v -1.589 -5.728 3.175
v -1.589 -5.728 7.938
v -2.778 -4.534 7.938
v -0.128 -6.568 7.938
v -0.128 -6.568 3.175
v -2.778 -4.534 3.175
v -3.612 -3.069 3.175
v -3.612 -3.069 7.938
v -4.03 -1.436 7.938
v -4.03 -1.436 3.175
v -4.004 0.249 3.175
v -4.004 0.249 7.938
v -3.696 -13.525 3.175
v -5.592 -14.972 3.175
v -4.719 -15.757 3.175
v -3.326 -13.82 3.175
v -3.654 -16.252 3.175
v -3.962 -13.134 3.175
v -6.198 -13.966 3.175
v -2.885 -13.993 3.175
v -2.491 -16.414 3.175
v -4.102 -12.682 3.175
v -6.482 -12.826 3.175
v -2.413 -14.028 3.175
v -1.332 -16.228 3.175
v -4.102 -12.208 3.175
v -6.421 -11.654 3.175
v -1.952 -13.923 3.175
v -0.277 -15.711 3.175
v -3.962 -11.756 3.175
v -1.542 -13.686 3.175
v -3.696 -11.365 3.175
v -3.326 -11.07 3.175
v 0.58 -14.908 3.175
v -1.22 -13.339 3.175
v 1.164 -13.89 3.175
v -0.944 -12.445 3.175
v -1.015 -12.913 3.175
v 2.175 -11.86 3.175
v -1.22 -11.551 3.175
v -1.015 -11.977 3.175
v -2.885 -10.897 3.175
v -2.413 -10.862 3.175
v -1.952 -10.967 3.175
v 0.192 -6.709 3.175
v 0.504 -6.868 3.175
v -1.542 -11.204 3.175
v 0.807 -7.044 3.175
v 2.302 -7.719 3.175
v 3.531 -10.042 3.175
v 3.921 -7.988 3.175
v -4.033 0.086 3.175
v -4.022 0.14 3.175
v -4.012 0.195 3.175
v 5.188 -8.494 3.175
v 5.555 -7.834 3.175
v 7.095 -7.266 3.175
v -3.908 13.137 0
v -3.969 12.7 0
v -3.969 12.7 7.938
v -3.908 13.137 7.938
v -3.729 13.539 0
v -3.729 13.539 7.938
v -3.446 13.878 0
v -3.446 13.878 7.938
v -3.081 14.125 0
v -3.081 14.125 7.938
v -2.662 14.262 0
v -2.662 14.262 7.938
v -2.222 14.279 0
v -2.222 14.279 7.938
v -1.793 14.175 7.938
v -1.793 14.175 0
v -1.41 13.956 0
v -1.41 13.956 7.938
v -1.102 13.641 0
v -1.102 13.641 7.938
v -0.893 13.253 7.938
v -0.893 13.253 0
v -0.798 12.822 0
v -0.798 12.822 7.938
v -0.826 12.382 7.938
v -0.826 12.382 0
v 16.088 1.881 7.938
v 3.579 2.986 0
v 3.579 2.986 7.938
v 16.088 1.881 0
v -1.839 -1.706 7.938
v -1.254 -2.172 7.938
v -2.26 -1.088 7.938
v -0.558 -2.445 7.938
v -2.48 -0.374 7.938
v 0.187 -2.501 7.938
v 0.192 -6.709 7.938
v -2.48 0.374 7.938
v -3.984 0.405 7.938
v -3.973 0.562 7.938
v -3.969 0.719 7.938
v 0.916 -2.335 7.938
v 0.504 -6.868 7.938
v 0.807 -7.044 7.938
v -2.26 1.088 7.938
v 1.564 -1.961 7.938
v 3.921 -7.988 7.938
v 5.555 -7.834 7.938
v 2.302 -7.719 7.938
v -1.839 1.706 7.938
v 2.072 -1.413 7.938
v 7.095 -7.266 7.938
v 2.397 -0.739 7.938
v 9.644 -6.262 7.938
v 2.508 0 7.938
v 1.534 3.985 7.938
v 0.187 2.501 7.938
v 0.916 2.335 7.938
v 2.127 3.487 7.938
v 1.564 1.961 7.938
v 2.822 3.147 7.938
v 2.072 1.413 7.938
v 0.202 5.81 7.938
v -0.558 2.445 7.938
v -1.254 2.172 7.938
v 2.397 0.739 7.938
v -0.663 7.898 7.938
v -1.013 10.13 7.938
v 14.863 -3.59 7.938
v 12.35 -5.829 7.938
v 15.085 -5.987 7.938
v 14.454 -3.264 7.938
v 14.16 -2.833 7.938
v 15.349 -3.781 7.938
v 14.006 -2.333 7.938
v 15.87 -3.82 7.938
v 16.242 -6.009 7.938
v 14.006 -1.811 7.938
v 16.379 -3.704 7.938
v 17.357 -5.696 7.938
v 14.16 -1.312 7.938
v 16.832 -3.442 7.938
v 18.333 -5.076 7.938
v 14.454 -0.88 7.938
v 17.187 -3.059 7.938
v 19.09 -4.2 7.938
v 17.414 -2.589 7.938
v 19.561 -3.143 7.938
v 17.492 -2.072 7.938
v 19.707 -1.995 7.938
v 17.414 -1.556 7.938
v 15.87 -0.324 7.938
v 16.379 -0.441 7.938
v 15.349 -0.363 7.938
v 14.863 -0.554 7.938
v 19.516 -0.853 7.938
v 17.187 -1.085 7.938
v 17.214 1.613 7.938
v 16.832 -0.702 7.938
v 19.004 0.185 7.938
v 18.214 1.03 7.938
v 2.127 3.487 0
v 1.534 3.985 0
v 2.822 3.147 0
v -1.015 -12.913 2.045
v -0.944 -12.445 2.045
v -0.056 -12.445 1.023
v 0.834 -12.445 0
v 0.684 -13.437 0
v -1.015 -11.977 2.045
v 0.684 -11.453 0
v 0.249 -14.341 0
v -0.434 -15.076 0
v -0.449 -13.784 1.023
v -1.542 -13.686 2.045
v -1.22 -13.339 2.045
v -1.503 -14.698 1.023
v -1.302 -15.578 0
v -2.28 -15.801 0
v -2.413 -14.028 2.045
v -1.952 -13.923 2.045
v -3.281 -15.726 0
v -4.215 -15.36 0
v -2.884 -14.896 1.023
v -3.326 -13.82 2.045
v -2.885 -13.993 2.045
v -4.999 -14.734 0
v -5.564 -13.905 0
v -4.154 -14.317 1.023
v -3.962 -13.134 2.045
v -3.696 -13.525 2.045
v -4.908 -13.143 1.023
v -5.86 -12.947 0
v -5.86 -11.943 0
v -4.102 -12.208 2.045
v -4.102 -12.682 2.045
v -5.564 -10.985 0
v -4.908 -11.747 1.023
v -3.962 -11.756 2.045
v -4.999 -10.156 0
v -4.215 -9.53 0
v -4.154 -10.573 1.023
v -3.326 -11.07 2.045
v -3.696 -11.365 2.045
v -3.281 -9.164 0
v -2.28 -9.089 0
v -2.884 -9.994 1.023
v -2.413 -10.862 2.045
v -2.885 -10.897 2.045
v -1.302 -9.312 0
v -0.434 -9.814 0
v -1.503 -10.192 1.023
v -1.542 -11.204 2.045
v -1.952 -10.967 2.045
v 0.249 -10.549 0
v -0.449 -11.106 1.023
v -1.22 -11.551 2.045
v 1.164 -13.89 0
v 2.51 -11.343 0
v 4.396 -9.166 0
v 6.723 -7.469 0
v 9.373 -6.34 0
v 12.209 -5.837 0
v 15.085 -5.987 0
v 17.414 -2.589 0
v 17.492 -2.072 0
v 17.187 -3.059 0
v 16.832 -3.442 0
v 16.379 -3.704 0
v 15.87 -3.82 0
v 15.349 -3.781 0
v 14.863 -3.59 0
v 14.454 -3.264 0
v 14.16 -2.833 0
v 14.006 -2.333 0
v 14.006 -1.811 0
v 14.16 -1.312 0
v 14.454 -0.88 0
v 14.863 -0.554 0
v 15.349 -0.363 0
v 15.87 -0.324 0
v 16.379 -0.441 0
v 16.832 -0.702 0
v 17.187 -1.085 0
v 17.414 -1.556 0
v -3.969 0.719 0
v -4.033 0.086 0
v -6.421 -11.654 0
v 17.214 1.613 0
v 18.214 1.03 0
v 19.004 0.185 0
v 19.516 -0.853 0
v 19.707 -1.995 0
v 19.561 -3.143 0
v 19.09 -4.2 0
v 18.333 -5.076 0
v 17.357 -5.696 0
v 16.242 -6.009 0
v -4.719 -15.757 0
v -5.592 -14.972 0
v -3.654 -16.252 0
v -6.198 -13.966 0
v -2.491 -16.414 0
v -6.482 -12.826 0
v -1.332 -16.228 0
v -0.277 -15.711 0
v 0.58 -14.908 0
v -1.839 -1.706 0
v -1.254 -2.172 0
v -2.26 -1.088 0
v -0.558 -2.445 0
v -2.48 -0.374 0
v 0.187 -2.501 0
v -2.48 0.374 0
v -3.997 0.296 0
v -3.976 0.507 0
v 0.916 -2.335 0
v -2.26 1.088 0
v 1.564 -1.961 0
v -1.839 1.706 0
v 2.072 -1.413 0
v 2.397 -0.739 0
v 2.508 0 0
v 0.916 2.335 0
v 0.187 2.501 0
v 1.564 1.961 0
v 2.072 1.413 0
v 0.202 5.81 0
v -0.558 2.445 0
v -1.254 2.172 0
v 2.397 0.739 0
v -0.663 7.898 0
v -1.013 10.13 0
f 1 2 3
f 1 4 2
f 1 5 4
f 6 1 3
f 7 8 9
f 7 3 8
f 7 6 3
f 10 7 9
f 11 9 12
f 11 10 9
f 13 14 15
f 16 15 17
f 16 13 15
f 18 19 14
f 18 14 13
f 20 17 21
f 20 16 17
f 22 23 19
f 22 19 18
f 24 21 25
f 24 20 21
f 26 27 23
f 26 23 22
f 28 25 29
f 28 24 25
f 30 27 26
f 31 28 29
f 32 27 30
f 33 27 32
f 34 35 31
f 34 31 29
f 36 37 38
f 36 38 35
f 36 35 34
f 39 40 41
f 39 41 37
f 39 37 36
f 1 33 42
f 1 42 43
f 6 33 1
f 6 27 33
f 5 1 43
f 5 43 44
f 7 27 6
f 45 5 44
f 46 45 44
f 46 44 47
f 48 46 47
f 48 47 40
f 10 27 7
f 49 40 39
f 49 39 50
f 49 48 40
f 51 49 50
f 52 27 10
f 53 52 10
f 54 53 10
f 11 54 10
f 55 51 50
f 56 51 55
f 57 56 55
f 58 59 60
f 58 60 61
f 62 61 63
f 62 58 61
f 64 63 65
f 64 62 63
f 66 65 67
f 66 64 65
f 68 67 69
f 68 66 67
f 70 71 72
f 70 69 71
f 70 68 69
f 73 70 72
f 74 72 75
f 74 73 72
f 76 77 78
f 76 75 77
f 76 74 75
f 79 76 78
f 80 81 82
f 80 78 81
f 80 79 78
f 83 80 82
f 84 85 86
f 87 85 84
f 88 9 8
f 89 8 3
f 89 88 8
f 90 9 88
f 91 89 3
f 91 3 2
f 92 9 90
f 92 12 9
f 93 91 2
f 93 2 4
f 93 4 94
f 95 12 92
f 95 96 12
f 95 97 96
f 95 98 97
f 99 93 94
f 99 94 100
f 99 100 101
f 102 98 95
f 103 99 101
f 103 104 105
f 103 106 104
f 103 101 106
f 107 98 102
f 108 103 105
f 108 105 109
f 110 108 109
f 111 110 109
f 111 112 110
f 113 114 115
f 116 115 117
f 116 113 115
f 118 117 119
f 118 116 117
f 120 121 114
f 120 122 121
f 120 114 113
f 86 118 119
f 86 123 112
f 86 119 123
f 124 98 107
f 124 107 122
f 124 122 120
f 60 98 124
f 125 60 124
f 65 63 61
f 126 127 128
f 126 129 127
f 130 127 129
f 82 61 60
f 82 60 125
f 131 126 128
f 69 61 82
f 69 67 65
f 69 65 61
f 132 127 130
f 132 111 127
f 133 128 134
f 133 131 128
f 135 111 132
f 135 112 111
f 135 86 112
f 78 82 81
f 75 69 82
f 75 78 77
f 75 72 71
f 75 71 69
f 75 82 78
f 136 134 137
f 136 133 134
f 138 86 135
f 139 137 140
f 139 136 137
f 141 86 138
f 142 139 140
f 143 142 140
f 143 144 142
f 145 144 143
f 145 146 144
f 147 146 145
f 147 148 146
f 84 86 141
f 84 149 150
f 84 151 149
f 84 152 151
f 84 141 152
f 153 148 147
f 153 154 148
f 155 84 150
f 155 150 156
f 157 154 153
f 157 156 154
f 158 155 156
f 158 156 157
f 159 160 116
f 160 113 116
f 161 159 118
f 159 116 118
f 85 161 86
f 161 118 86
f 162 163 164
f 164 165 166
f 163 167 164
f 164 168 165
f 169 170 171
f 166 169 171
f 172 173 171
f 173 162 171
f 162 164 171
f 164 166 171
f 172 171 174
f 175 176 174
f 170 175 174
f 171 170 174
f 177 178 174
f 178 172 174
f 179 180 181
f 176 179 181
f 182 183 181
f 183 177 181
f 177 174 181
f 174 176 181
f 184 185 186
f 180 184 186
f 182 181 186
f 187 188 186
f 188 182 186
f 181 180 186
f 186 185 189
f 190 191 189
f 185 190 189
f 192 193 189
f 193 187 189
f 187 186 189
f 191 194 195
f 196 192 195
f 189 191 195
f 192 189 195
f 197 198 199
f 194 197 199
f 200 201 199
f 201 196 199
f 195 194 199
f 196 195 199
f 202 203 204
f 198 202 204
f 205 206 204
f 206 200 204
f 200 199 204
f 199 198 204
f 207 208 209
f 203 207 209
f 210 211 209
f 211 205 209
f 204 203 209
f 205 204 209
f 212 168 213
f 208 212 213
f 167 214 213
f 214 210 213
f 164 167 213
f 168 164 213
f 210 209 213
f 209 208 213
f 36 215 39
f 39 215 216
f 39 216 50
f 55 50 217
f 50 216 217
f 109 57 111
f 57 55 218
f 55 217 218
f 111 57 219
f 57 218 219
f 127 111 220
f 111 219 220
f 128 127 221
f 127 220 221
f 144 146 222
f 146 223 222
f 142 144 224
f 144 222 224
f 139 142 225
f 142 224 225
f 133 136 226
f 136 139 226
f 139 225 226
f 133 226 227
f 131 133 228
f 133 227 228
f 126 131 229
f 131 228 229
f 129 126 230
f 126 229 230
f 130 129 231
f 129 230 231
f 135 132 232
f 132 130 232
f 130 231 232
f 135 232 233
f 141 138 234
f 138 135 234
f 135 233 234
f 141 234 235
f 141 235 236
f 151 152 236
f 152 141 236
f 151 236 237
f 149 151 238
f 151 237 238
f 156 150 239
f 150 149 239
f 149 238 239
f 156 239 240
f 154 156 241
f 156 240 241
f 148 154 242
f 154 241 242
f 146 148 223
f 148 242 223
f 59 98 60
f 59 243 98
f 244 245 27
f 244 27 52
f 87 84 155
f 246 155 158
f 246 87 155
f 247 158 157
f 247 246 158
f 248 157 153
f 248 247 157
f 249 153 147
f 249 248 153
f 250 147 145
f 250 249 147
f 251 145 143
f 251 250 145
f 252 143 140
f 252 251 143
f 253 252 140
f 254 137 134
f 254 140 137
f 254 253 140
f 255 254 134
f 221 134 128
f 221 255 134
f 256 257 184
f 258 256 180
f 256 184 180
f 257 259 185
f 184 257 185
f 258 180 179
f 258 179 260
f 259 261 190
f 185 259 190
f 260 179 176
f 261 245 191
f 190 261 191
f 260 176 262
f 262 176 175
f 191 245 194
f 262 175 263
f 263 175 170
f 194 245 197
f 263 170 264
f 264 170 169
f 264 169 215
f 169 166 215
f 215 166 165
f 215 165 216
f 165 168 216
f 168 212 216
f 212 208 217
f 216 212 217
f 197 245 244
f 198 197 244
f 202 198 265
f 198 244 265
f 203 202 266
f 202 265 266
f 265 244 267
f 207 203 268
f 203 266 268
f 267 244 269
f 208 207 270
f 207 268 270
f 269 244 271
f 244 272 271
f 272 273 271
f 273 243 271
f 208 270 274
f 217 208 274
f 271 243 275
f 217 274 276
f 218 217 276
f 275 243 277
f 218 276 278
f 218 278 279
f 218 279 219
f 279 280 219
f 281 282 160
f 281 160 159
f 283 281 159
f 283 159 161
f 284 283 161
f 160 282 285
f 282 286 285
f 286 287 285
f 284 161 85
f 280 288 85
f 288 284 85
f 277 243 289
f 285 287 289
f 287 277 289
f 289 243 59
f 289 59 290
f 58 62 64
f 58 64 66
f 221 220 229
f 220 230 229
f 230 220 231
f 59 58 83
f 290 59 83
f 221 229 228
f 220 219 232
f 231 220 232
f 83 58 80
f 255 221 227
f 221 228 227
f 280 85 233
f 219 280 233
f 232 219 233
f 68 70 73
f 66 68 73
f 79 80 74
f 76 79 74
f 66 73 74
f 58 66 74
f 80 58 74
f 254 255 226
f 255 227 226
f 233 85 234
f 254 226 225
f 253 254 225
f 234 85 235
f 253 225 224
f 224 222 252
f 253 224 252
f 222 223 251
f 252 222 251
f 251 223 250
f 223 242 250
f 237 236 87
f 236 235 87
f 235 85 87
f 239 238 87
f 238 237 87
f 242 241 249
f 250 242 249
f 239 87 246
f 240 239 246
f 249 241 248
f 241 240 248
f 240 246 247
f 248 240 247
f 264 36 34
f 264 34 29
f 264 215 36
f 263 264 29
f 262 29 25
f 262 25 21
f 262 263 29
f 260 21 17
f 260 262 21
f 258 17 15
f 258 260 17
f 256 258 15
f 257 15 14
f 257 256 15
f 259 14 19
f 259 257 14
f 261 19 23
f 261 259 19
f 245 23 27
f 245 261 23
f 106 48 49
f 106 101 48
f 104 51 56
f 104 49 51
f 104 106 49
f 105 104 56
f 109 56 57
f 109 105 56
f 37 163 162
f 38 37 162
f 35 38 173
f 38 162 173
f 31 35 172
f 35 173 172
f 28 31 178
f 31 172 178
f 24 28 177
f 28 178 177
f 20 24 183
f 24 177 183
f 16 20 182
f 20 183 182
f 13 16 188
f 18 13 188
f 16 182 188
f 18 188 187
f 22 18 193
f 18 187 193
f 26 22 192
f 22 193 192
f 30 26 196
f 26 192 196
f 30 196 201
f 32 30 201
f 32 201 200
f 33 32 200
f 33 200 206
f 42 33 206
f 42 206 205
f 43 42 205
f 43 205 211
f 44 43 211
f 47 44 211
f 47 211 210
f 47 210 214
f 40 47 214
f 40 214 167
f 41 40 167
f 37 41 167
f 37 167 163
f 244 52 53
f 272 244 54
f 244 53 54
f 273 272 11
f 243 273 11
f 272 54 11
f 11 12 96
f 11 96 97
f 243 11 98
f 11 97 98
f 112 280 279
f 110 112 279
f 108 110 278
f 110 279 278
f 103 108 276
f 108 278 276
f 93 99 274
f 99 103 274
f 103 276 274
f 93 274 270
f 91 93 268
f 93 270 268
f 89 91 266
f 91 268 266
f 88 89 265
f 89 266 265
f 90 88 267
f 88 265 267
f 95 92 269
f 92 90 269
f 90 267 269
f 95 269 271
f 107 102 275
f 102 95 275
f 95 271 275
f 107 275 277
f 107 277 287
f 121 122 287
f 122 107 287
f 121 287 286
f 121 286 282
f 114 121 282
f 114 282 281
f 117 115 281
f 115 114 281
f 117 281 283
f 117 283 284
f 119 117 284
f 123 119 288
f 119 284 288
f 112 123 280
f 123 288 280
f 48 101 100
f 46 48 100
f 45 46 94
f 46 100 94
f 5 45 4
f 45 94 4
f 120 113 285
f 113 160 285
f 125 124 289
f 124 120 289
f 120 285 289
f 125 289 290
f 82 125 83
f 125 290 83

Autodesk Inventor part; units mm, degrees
ref_plane "YZ Plane" through (0, 0, 0) normal (1, 0, 0) x (0, 1, 0)
ref_plane "XZ Plane" through (0, 0, 0) normal (0, 1, 0) x (-1, 0, 0)
ref_plane "XY Plane" through (0, 0, 0) normal (0, 0, 1) x (1, 0, 0)
sketch "Sketch4" plane through (0, 0, 0) normal (0, 0, 1) x (1, 0, 0)
  circle A0 centre (0, 0) radius 2.5083
  circle A1 centre (0, 0) radius 3.9688
  line L0 (-3.9688, 0) -> (-3.9688, 12.7)
  arc A2 (-0.8259, 12.3821) -> (-3.9688, 12.7) centre (-2.3812, 12.7) ccw
  arc A3 (-0.8259, 12.3821) -> (2.5018, 3.0809) centre (8.5062, 10.475) ccw
  circle A4 centre (0, 0) radius 4.7625 construction
  circle A5 centre (15.7392, -2.0721) radius 6.35 construction
  circle A6 centre (15.7392, -2.0721) radius 3.9688
  circle A7 centre (15.7392, -2.0721) radius 1.7526
  line L1 (2.5018, 3.0809) -> (16.0883, 1.8813)
  circle A8 centre (-2.532, -12.445) radius 3.9688
  circle A9 centre (-2.532, -12.445) radius 1.5875
  line L2 (-6.421, -11.6538) -> (-3.8891, 0.7912)
  line L3 (17.6986, -5.5234) -> (-0.5726, -15.8964)
  line L4 (0, 0) -> (15.7392, -2.0721) construction
  line L5 (15.7392, -2.0721) -> (16.2572, 1.8627) construction
  line L6 (0, 4.7625) -> (0, 0) construction
  line L7 (-2.532, -12.445) -> (0, 0) construction
  line L8 (-2.532, -12.445) -> (-4.0876, -12.1285) construction
  circle A10 centre (-2.532, -12.445) radius 4.7625 construction
  arc A11 (15.0853, -5.9866) -> (1.1645, -13.8898) centre (12.993, -18.5131) ccw
  point P0 (3.9688, 0)
  point P1 (2.0561, -3.3946)
  dimension "d54" = 9.525
  dimension "d62" = 3.175
  dimension "d44" = 5.0165
  dimension "d45" = 7.9375
  dimension "d51" = 12.7
  dimension "d52" = 3.175
  dimension "d53" = 9.525
  dimension "d56" = 12.7
  dimension "d57" = 7.9375
  dimension "d58" = 3.5052
  dimension "d61" = 7.9375
  dimension "Lever_Offset" = 15.875
  dimension "Lever_Angle" = 97.5
  dimension "d72" = 191.5
  dimension "d73" = 12.7
  dimension "d74" = 9.525
  dimension "d75" = 25.4
extrude "Extrusion3" add sketch "Sketch4" along normal blind 7.9375 contours A1 | A1 L1 A6 A11 A8 L2 L0 | A1 L2 L0 A2 A3 | L0 L2 A1 | A6 | A8
fillet "Fillet5" radius 3.175 2 edges at (2.5018, 3.0809, 3.9688) (-3.9688, 0.3996, 3.9688)
sketch "Sketch5" plane through (0, 0, 7.9375) normal (0, 0, 1) x (1, 0, 0)
  arc A0 (15.0853, -5.9866) -> (16.0883, 1.8813) centre (15.7392, -2.0721) ccw projected
  arc A1 (-0.8259, 12.3821) -> (1.5343, 3.9852) centre (8.5062, 10.475) ccw projected
  arc A2 (-0.8259, 12.3821) -> (-3.9688, 12.7) centre (-2.3812, 12.7) ccw projected
  arc A3 (-6.421, -11.6538) -> (1.1645, -13.8898) centre (-2.532, -12.445) ccw projected
  circle A4 centre (-2.532, -12.445) radius 6.35
  circle A5 centre (0, 0) radius 3.9688
  circle A6 centre (15.7392, -2.0721) radius 6.4439
  line L0 (-4.0325, 0.0863) -> (-6.421, -11.6538) projected
  line L1 (16.0883, 1.8813) -> (3.579, 2.9858) projected
  arc A7 (1.5343, 3.9852) -> (3.579, 2.9858) centre (3.8582, 6.1485) ccw projected
  circle A8 centre (0, 0) radius 2.5083 projected
  line L2 (-3.9688, 12.7) -> (-3.9688, 0.7193) projected
  arc A9 (-4.0325, 0.0863) -> (-3.9688, 0.7193) centre (-7.1437, 0.7193) ccw projected
  arc A10 (15.0853, -5.9866) -> (1.1645, -13.8898) centre (12.993, -18.5131) ccw projected
  point P0 (-3.9688, 0)
  point P1 (15.0677, -4.2555)
  point P2 (12.7369, 2.861)
  point P3 (11.0312, 2.3278)
  point P4 (10.6542, -6.0303)
  dimension "d76" = 12.7
extrude "Extrusion4" cut sketch "Sketch5" against normal blind 4.7625 contours A10 A3 L0 A4 | A4 L0 A3 A10
chamfer "Chamfer2" distance 1.778 angle 49 1 edges at (-4.1195, -12.445, 0) measured on face at (8.6395, -2.6642, 0)
fillet "Fillet6" radius 6.35 2 edges at (-5.4328, -6.7963, 5.5563) (3.403, -10.1871, 5.5563)
properties part number "Lever" material "Aluminum 6061"
